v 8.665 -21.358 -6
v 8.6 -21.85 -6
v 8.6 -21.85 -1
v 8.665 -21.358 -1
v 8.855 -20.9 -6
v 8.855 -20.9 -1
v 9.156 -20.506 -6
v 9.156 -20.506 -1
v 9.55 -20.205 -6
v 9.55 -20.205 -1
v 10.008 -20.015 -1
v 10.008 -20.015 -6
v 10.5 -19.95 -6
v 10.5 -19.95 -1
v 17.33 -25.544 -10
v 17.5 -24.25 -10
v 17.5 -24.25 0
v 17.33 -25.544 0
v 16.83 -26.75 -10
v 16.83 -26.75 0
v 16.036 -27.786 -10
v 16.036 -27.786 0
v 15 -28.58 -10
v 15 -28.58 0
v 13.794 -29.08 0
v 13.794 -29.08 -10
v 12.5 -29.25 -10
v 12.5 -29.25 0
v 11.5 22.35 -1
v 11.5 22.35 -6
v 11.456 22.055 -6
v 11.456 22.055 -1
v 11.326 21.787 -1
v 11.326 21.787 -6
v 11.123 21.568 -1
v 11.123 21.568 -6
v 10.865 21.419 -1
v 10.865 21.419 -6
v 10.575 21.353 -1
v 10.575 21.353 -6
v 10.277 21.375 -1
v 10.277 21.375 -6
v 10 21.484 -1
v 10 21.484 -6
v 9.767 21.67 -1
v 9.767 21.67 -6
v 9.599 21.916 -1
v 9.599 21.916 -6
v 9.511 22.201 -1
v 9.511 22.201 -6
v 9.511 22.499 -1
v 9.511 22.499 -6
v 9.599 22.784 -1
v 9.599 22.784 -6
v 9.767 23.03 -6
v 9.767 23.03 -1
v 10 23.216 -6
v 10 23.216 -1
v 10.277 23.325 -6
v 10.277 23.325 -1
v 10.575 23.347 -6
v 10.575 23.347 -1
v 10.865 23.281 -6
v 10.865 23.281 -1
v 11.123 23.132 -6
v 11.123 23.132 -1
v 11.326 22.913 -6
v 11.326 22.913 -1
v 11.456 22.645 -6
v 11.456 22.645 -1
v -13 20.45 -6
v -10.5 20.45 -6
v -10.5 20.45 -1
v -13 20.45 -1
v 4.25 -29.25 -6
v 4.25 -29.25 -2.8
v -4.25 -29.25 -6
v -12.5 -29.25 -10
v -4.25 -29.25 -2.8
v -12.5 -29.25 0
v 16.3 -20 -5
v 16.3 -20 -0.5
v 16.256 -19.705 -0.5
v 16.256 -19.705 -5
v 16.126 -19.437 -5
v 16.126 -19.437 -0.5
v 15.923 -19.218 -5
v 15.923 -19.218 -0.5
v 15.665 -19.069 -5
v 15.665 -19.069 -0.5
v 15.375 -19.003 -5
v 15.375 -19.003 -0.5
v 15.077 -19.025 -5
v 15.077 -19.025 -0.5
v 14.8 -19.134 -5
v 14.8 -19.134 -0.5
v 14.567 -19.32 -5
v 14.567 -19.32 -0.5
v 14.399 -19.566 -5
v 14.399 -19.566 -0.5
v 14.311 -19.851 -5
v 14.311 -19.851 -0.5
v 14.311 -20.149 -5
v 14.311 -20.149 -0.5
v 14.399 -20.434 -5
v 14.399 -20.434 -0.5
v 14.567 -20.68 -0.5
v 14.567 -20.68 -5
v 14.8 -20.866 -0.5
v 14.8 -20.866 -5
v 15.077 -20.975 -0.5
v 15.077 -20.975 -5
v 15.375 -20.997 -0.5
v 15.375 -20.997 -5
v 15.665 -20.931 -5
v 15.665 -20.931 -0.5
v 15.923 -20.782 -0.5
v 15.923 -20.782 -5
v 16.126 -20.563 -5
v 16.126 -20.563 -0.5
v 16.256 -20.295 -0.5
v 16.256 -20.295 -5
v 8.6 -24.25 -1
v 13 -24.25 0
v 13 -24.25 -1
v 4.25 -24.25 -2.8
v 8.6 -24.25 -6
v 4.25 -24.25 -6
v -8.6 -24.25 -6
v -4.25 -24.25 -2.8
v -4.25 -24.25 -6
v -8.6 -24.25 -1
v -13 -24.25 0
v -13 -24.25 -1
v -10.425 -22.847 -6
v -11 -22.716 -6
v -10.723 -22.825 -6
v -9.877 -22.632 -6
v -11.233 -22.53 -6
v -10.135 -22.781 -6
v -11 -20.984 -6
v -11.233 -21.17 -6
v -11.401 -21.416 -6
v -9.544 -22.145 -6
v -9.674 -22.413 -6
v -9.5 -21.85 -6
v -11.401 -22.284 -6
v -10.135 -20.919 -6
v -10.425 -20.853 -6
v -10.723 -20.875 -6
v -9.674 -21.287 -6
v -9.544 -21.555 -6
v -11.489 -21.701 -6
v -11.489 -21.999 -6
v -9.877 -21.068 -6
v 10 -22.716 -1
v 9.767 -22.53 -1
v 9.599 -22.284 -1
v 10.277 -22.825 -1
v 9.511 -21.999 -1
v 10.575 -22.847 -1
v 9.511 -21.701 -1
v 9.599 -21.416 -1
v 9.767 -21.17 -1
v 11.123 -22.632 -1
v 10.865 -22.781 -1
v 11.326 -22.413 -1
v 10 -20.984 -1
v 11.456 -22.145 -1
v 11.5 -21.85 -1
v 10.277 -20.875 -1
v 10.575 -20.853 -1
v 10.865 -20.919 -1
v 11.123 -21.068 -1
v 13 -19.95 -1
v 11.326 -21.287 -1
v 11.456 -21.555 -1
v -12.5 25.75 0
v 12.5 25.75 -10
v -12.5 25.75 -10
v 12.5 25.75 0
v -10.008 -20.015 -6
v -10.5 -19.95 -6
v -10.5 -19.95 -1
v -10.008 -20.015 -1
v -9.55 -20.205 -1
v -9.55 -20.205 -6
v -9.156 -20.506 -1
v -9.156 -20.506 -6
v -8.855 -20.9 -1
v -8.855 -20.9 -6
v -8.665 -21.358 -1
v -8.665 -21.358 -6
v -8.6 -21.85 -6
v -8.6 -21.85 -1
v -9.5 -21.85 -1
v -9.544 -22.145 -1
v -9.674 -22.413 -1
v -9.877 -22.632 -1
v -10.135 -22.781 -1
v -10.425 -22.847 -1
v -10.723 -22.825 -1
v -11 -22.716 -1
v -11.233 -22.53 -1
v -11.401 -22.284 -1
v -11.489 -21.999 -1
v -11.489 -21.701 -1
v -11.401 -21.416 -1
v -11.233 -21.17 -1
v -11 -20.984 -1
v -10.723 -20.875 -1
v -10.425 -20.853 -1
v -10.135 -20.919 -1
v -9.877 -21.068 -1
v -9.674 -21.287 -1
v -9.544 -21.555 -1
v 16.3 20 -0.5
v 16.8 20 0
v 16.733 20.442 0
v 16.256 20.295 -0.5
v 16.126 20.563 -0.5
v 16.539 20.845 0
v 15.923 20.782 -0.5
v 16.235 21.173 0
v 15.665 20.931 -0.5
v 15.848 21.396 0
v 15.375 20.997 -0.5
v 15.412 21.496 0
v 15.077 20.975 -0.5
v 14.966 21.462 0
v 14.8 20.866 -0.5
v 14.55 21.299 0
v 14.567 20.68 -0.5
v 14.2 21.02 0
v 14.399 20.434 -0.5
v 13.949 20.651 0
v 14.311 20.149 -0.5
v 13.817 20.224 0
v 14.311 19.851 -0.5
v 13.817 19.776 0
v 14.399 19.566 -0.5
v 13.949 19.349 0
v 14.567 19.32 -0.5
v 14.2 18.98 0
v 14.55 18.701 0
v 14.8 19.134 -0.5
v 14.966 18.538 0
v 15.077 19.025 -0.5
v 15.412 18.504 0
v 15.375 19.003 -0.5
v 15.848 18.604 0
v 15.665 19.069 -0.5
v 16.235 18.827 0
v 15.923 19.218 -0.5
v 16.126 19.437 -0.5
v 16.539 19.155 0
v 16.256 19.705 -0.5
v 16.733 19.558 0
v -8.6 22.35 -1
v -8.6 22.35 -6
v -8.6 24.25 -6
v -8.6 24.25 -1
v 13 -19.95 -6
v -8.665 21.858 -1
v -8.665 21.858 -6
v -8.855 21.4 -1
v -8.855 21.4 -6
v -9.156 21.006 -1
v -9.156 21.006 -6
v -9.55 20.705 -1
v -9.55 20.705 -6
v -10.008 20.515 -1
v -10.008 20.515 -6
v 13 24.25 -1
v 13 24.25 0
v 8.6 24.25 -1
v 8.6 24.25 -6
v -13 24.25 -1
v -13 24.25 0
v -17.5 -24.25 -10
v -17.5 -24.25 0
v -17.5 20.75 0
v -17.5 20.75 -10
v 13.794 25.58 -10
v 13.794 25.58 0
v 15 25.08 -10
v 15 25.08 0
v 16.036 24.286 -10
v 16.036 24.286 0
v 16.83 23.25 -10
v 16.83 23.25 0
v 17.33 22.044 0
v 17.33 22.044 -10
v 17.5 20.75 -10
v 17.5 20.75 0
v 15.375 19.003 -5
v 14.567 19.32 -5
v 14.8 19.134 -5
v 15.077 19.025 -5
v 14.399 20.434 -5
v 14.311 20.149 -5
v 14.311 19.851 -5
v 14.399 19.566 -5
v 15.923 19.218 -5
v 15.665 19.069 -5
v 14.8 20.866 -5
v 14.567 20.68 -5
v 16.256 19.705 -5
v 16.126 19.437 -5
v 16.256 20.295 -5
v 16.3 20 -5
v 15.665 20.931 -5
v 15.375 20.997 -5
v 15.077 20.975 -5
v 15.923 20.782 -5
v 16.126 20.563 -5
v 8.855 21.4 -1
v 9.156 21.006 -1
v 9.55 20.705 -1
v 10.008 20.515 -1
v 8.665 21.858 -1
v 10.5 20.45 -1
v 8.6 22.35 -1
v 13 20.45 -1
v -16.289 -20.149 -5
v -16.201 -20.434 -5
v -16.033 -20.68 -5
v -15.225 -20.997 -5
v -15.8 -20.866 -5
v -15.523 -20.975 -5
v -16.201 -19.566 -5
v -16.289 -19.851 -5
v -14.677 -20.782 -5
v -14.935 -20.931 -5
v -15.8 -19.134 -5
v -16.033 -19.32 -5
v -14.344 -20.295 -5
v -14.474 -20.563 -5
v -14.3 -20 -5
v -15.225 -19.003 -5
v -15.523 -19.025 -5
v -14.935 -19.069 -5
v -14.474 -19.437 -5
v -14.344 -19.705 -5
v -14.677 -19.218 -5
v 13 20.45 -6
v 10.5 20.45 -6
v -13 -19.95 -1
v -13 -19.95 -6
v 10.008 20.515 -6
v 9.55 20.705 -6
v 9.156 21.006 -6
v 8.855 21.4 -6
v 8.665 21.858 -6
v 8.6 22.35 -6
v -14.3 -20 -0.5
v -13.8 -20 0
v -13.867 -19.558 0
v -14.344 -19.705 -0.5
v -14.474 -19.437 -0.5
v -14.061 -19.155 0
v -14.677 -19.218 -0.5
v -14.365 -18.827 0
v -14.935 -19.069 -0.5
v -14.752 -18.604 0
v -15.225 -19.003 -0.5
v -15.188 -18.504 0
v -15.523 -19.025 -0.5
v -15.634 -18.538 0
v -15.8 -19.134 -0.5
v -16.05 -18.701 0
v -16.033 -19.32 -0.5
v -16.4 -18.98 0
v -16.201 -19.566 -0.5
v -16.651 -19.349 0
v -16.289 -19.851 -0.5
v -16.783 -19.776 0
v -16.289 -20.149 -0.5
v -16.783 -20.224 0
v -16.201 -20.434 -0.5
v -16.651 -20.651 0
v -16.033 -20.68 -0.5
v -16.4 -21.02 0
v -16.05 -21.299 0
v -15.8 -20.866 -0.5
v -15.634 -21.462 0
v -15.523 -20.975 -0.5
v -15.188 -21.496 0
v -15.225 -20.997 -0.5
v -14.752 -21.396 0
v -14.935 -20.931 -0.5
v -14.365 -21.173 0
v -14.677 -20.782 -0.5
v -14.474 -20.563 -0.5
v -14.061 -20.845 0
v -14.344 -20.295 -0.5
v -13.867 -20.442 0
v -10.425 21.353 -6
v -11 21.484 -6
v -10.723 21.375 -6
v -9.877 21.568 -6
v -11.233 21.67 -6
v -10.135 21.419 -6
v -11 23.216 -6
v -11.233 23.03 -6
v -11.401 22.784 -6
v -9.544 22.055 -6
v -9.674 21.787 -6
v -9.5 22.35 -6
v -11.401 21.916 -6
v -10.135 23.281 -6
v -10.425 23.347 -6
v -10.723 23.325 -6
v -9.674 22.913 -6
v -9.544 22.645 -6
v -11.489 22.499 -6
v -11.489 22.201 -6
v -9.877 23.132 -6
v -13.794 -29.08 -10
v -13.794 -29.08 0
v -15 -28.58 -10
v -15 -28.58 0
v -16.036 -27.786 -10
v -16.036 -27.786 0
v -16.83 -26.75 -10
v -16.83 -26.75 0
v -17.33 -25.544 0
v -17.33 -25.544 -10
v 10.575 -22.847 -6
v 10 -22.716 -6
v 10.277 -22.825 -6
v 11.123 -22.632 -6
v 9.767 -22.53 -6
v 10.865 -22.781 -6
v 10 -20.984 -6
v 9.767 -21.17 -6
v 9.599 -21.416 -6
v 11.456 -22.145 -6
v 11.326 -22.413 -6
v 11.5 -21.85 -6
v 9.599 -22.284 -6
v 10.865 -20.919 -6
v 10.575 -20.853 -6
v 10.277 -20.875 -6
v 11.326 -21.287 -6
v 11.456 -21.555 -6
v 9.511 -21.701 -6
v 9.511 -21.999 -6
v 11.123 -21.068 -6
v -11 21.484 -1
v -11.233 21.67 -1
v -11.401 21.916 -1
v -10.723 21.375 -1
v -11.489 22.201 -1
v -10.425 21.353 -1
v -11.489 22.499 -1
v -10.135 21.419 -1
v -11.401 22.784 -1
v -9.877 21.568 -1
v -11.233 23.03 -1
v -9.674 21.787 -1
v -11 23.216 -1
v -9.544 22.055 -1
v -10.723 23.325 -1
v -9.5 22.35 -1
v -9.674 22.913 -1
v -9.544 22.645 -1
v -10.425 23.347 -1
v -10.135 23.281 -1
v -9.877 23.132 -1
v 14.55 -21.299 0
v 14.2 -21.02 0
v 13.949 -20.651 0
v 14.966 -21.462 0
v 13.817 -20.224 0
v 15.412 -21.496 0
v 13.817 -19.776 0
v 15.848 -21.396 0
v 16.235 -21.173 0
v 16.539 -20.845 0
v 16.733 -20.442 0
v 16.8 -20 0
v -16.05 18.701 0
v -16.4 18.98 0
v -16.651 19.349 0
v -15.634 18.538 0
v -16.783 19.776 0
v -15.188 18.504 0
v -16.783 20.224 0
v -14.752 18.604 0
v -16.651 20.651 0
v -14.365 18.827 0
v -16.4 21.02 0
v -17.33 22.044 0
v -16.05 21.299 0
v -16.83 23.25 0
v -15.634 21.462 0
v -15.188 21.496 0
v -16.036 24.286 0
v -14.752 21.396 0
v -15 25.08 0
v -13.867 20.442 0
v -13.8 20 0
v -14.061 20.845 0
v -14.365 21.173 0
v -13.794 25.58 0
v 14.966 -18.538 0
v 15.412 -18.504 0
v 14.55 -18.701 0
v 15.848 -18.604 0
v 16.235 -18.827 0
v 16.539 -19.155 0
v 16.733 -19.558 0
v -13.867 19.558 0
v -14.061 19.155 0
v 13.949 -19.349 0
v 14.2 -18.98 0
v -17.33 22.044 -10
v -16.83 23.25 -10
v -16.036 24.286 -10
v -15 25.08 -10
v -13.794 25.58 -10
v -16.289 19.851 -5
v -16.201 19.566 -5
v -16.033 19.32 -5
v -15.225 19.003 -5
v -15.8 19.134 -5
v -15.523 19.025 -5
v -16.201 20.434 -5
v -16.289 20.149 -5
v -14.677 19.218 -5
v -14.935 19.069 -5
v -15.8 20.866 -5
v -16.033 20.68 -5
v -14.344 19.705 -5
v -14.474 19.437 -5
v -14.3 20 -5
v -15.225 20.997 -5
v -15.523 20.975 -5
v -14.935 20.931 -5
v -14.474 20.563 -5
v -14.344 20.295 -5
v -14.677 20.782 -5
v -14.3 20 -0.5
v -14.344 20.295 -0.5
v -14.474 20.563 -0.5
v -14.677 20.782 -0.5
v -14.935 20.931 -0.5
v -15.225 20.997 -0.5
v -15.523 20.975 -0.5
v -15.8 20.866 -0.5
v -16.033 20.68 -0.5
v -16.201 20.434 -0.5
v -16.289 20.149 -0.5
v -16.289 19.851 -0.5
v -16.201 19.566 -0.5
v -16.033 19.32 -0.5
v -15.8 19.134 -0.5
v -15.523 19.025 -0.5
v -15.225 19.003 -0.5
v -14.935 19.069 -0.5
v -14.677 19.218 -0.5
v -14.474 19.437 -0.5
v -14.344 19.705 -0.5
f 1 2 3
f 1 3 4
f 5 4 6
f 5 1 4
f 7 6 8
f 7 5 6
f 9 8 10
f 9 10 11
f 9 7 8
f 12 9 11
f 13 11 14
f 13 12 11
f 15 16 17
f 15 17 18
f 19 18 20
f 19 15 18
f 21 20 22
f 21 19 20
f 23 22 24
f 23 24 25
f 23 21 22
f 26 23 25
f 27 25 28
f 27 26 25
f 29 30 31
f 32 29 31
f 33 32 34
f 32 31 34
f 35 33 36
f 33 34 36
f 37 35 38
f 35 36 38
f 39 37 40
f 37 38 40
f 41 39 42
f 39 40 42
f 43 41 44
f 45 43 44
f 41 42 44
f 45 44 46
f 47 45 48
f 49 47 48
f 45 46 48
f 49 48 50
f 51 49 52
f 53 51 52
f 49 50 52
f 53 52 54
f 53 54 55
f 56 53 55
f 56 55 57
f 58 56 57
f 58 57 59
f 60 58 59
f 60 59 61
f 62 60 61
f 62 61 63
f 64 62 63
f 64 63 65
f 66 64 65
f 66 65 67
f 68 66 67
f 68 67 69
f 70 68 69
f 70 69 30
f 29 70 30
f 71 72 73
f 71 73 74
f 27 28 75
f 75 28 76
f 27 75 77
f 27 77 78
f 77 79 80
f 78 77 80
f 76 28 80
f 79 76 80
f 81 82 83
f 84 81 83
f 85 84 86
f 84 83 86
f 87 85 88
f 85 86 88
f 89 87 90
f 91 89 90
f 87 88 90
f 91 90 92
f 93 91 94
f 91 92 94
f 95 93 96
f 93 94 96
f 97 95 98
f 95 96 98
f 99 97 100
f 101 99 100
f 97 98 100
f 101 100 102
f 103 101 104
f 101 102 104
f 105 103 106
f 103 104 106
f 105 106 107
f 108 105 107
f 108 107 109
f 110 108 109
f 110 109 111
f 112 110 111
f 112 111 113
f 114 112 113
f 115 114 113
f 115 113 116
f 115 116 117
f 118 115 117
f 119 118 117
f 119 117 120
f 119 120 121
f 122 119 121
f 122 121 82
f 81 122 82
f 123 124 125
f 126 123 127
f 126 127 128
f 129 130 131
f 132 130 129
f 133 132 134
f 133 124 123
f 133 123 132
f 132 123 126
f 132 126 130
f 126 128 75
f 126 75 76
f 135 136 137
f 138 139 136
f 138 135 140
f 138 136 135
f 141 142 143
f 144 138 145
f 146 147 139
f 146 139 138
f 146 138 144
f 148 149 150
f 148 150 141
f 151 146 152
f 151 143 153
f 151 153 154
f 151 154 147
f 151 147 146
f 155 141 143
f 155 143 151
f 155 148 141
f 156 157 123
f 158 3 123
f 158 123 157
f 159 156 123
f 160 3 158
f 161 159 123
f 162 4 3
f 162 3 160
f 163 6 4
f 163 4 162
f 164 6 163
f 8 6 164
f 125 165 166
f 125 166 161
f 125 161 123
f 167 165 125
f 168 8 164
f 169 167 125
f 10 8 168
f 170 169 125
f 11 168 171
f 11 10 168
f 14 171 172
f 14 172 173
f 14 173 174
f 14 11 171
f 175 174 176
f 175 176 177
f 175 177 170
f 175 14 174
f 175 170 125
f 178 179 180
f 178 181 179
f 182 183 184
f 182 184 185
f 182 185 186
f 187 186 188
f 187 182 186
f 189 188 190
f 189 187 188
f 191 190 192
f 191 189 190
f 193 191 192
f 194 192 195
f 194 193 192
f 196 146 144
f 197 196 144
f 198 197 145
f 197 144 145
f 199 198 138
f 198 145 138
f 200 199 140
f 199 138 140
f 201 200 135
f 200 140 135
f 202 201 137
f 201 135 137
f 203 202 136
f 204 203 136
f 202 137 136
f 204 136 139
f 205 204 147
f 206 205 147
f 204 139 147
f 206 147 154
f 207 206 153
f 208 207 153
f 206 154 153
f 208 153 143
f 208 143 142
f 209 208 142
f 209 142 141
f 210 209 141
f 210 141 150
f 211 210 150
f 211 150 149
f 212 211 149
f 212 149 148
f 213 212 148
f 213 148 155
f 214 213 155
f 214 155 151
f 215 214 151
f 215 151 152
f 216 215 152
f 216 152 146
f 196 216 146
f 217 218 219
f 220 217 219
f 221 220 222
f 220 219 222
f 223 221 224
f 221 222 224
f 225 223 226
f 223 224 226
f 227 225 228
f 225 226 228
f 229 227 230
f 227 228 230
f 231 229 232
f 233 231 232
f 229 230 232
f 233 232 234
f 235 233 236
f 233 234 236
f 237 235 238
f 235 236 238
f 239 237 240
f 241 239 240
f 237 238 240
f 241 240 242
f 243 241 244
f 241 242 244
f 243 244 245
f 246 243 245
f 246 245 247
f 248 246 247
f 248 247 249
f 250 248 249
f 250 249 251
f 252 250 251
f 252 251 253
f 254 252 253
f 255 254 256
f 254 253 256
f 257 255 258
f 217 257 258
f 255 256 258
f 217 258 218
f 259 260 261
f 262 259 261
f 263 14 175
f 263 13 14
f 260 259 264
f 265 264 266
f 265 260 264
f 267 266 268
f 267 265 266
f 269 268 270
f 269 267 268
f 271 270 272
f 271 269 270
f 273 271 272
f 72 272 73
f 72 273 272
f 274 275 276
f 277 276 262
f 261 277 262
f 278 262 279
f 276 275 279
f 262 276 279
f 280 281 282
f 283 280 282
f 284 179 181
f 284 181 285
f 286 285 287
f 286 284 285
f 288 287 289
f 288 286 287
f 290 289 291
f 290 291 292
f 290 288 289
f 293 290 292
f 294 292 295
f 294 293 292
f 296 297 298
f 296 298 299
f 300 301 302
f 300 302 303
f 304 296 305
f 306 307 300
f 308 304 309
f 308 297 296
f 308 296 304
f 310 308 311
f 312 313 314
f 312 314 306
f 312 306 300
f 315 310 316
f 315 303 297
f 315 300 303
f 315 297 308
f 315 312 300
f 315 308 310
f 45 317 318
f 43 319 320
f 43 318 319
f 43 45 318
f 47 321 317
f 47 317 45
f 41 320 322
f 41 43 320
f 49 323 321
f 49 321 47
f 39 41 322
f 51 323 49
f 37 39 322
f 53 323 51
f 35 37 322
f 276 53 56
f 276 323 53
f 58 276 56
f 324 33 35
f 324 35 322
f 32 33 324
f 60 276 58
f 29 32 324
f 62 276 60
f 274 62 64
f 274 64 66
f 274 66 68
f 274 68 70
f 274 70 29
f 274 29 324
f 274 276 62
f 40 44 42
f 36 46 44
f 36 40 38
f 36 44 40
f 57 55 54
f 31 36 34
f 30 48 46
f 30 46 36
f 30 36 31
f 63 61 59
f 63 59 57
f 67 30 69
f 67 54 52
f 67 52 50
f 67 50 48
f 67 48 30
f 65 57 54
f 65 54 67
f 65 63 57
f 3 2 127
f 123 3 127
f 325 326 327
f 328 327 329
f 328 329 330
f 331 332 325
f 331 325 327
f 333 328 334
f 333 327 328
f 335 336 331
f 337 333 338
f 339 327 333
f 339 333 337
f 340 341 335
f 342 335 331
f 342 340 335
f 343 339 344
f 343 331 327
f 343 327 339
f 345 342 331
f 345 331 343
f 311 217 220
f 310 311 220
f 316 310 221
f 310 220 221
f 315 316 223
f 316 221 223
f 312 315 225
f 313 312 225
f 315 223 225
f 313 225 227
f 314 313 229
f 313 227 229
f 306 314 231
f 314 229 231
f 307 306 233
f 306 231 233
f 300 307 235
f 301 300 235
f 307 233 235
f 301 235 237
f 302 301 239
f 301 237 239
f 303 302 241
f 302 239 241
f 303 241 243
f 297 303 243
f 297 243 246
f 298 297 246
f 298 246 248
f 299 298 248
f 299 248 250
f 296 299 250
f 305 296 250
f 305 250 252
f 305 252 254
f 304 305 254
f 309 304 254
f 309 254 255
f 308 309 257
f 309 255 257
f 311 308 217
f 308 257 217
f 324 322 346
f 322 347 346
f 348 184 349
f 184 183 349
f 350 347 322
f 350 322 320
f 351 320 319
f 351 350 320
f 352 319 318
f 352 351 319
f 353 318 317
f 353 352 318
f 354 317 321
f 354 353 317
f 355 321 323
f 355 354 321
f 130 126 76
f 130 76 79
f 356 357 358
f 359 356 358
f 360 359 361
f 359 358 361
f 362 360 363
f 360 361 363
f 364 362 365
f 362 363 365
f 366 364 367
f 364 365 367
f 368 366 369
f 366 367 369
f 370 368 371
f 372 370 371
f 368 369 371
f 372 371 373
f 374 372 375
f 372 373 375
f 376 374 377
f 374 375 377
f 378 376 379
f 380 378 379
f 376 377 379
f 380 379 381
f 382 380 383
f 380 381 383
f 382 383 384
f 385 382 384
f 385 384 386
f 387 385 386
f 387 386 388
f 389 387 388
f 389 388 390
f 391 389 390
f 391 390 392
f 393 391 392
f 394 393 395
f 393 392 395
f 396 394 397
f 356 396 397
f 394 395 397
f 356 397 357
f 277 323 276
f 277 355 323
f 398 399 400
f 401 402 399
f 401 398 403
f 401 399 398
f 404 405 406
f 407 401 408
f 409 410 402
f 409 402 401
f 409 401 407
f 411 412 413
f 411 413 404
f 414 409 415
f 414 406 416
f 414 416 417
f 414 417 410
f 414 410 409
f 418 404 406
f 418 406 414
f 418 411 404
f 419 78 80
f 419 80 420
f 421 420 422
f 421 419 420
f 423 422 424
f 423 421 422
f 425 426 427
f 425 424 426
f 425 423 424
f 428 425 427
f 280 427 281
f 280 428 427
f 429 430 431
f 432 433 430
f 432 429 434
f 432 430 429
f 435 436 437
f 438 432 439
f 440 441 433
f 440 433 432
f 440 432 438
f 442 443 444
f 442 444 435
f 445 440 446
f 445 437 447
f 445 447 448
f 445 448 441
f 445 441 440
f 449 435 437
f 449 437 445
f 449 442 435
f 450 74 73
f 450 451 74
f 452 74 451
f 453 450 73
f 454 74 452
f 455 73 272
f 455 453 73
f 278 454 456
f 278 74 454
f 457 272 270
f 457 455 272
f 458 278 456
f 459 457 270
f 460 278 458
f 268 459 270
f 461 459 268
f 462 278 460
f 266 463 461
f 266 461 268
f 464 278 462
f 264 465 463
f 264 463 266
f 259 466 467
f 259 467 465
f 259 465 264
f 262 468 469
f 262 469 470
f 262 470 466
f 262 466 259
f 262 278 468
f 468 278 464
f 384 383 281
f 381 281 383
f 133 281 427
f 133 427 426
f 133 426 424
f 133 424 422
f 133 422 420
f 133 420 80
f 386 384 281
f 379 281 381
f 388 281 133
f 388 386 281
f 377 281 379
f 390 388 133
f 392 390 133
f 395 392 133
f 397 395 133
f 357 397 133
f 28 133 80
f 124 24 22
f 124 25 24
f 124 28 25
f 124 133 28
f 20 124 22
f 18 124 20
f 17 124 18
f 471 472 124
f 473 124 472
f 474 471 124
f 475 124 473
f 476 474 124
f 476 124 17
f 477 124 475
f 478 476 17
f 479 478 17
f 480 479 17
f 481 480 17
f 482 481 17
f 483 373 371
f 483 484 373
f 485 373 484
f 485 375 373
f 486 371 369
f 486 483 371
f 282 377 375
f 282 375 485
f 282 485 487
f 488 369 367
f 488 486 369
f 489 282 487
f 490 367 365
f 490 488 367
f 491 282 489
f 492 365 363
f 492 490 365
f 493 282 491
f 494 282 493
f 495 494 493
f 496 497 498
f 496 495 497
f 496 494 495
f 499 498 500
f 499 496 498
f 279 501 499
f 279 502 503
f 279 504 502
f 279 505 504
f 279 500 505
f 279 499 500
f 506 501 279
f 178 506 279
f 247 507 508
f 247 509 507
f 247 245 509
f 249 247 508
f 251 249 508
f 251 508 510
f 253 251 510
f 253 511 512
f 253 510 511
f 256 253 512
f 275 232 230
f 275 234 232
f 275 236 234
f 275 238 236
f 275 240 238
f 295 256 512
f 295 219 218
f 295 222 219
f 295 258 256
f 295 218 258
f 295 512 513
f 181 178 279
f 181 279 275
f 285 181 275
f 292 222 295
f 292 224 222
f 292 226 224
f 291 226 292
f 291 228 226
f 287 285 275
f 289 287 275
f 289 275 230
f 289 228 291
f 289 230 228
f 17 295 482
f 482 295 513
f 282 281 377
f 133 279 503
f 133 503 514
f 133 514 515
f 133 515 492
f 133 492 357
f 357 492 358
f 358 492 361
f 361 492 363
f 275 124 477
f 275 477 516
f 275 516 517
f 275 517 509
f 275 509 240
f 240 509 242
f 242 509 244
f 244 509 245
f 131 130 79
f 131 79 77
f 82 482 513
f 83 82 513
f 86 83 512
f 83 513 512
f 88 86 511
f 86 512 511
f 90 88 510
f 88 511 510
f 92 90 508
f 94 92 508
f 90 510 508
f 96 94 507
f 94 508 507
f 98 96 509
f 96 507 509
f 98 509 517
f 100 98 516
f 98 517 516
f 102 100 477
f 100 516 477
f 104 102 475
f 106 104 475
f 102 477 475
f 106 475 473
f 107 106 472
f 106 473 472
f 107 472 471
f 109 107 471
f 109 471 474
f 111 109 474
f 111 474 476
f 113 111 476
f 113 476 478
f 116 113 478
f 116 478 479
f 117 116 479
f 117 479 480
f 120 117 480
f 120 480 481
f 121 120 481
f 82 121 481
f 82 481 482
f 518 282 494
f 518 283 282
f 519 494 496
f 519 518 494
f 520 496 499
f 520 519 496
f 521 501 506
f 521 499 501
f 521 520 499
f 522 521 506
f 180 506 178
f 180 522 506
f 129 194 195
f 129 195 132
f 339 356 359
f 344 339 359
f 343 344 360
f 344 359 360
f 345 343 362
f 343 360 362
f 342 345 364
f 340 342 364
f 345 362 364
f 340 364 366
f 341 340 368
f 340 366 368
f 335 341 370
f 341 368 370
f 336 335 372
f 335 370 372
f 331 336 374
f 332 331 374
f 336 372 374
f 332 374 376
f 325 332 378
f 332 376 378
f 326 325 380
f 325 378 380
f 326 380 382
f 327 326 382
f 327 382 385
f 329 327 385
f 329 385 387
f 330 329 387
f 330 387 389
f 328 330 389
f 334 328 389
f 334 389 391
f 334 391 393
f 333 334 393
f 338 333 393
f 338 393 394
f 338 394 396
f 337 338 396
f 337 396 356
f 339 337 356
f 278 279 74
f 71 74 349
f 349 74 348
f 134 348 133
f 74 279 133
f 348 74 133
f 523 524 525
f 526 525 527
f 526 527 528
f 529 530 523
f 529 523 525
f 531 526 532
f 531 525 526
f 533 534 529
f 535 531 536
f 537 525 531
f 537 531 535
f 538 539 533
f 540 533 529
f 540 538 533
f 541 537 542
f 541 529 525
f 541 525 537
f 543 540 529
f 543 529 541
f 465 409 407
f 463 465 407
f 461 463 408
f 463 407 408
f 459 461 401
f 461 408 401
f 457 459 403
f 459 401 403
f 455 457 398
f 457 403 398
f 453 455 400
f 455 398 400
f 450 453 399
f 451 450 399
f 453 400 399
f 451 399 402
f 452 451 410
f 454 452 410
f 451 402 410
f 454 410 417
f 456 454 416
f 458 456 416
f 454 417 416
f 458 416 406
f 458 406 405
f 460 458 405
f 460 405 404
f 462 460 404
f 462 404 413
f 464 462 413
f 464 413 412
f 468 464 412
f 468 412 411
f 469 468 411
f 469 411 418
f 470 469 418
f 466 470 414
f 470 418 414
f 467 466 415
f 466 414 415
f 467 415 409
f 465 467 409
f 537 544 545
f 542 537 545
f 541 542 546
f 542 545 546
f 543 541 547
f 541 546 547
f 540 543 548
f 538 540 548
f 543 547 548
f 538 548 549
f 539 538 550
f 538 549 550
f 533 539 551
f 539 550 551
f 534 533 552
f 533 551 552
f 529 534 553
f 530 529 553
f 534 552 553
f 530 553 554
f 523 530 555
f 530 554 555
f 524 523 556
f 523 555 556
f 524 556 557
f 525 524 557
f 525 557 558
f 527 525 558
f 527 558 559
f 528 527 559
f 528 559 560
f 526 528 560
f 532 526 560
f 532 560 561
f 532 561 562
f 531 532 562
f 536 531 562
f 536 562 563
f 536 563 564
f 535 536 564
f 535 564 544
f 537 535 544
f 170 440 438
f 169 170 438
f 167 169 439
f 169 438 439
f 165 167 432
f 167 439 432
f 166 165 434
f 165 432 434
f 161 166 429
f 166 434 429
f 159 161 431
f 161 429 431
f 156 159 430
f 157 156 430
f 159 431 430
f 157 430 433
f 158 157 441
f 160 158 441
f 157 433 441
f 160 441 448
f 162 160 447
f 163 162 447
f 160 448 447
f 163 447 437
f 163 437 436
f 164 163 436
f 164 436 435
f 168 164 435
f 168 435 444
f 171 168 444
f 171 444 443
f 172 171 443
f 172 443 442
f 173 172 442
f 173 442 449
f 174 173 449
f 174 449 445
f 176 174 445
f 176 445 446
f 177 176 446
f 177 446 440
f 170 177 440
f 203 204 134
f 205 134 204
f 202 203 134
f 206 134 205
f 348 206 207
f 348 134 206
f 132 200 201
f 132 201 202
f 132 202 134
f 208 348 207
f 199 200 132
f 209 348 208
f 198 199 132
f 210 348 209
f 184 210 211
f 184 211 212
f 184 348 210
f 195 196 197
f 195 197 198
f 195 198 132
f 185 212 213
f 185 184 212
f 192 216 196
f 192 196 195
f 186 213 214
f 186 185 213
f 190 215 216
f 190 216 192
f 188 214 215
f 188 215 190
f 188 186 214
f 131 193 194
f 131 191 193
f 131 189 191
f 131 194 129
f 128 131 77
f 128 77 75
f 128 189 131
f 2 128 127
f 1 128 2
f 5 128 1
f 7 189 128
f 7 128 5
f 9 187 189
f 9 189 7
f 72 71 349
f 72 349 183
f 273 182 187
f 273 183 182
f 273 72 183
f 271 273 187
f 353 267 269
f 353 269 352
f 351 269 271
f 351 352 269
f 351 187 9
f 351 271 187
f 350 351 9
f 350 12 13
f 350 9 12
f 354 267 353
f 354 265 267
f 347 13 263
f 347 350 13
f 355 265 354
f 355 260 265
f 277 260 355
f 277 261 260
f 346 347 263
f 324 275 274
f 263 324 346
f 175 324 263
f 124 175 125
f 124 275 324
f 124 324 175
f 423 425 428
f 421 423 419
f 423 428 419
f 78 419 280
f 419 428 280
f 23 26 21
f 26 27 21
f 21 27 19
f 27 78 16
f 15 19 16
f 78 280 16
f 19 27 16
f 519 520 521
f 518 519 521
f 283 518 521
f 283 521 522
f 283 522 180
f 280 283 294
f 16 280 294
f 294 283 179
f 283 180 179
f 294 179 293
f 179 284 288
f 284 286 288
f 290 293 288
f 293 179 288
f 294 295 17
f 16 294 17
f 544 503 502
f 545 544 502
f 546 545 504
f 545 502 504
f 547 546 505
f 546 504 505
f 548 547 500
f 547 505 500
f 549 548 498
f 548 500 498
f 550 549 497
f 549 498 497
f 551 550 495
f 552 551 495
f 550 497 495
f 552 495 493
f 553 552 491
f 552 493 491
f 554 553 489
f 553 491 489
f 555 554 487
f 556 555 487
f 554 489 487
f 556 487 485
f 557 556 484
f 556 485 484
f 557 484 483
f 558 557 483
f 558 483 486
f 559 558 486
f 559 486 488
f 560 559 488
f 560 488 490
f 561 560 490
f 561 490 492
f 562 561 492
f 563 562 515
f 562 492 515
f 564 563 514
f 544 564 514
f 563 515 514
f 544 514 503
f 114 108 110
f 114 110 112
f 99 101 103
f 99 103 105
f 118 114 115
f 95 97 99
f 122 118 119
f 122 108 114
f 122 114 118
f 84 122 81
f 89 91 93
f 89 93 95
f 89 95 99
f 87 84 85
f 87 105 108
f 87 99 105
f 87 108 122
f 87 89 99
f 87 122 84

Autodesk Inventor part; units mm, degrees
ref_plane "YZ Plane" through (0, 0, 0) normal (1, 0, 0) x (0, 1, 0)
ref_plane "XZ Plane" through (0, 0, 0) normal (0, 1, 0) x (-1, 0, 0)
ref_plane "XY Plane" through (0, 0, 0) normal (0, 0, 1) x (1, 0, 0)
sketch "스케치1" plane through (0, 0, 0) normal (0, 0, 1) x (1, 0, 0)
  line L0 (-17.5, 29.25) -> (17.5, 29.25)
  line L1 (17.5, 29.25) -> (17.5, -29.25)
  line L2 (17.5, -29.25) -> (-17.5, -29.25)
  line L3 (-17.5, -29.25) -> (-17.5, 29.25)
  line L4 (-17.5, 29.25) -> (17.5, -29.25) construction
  line L5 (17.5, 29.25) -> (-17.5, -29.25) construction
  line L6 (-13, -24.25) -> (13, -24.25)
  line L7 (13, -24.25) -> (13, 24.25)
  line L8 (13, 24.25) -> (-13, 24.25)
  line L9 (-13, 24.25) -> (-13, -24.25)
  line L10 (-13, -24.25) -> (13, 24.25) construction
  line L11 (13, -24.25) -> (-13, 24.25) construction
  line L12 (-9.5, 24.25) -> (9.5, 24.25)
  line L13 (9.5, 24.25) -> (9.5, -24.25)
  line L14 (9.5, -24.25) -> (-9.5, -24.25)
  line L15 (-9.5, -24.25) -> (-9.5, 24.25)
  line L16 (-9.5, 24.25) -> (9.5, -24.25) construction
  line L17 (9.5, 24.25) -> (-9.5, -24.25) construction
  line L18 (17.5, 25.75) -> (-17.5, 25.75)
  point P0 (0, 0)
  dimension "d0" = 58.5
  dimension "d1" = 35
  dimension "d2" = 26
  dimension "d3" = 48.5
  dimension "d4" = 3.5
  dimension "d10" = 1.5
extrude "돌출1" add sketch "스케치1" against normal blind 10 contours L18 L1 L2 L3 | L9 L8 L15 L6 | L15 L8 L13 L6 | L13 L8 L7 L6
extrude "돌출3" cut sketch "스케치1" against normal blind 6 contours L9 L8 L15 L6 | L15 L8 L13 L6 | L13 L8 L7 L6
sketch "스케치2" plane through (0, 0, -6) normal (0, 0, 1) x (1, 0, 0)
  circle A0 centre (10.5, 22.35) radius 1
  line L0 (10.5, 22.35) -> (-10.5, 22.35) construction
  line L1 (-13, 24.25) -> (13, 24.25) construction
  line L2 (0, 0) -> (0, 7.5455)
  circle A1 centre (-10.5, 22.35) radius 1
  line L3 (-13, 24.25) -> (13, 24.25) projected
  line L4 (0, 24.25) -> (0, -23.75) construction
  line L5 (0, 0.25) -> (5.5908, 0.25)
  circle A2 centre (10.5, -21.85) radius 1
  circle A3 centre (-10.5, -21.85) radius 1
  circle A4 centre (-10.5, 22.35) radius 1.9
  circle A5 centre (10.5, 22.35) radius 1.9
  circle A6 centre (10.5, -21.85) radius 1.9
  circle A7 centre (-10.5, -21.85) radius 1.9
  line L6 (-8.6, -21.85) -> (-8.6, -24.25)
  line L7 (13, -24.25) -> (-13, -24.25) projected
  line L8 (-10.5, -19.95) -> (-13, -19.95)
  line L9 (-13, -24.25) -> (-13, 24.25) projected
  line L10 (13, 24.25) -> (13, -24.25) projected
  line L11 (10.5, -19.95) -> (13, -19.95)
  line L12 (8.6, -21.85) -> (8.6, -24.25)
  line L13 (-8.6, 22.35) -> (-8.6, 24.75)
  line L14 (-10.5, 20.45) -> (-13, 20.45)
  line L15 (10.5, 20.45) -> (13, 20.45)
  line L16 (8.6, 22.35) -> (8.6, 24.75)
  point P0 (0, 22.35)
  point P1 (8.6, 24.25)
  point P2 (-8.6, 24.25)
  dimension "d13" = 2
  dimension "d14" = 21
  dimension "d15" = 1.9
  dimension "d16" = 48
  dimension "d17" = 3.8
  dimension "d18" = 3.8
extrude "돌출4" add sketch "스케치2" along normal blind 6 contours L3 A4 L14 L9 | L3 L13 A4 | A4 | L8 A7 L6 L7 L9 | L3 A5 L16 | A7 | L3 L10 L15 A5 | A5 | L12 A6 L11 L10 L7 | A6
sketch "스케치3" plane through (0, 0, 0) normal (0, 0, 1) x (1, 0, 0)
  line L0 (-8.6, 24.25) -> (8.6, 24.25) projected
  line L1 (-8.6, 24.25) -> (-13, 24.25)
  line L2 (-13, 24.25) -> (13, 24.25)
  line L3 (13, 24.25) -> (13, -24.25)
  line L4 (13, -24.25) -> (-13, -24.25)
  line L5 (-13, -24.25) -> (-13, 24.25)
  circle A0 centre (-10.5, -21.85) radius 1 projected
  circle A1 centre (10.5, 22.35) radius 1 projected
  circle A2 centre (10.5, -21.85) radius 1 projected
  circle A3 centre (-10.5, 22.35) radius 1 projected
  line L6 (-13, -19.95) -> (-13, 20.45) projected
  line L7 (-13, 20.45) -> (-10.5, 20.45) projected
  arc A4 (-10.5, 20.45) -> (-8.6, 22.35) centre (-10.5, 22.35) ccw projected
  line L8 (-8.6, 22.35) -> (-8.6, 24.25) projected
  line L9 (-8.6, 24.25) -> (8.6, 24.25) projected
  line L10 (8.6, 24.25) -> (8.6, 22.35) projected
  arc A5 (8.6, 22.35) -> (10.5, 20.45) centre (10.5, 22.35) ccw projected
  line L11 (10.5, 20.45) -> (13, 20.45) projected
  line L12 (13, 20.45) -> (13, -19.95) projected
  line L13 (13, -19.95) -> (10.5, -19.95) projected
  arc A6 (10.5, -19.95) -> (8.6, -21.85) centre (10.5, -21.85) ccw projected
  line L14 (8.6, -21.85) -> (8.6, -24.25) projected
  line L15 (8.6, -24.25) -> (-8.6, -24.25) projected
  line L16 (-8.6, -24.25) -> (-8.6, -21.85) projected
  arc A7 (-8.6, -21.85) -> (-10.5, -19.95) centre (-10.5, -21.85) ccw projected
  line L17 (-10.5, -19.95) -> (-13, -19.95) projected
  line L18 (17.5, -29.25) -> (17.5, 25.75) projected
  line L19 (17.5, 25.75) -> (-17.5, 25.75) projected
  line L20 (-17.5, 25.75) -> (-17.5, -29.25) projected
  line L21 (-17.5, -29.25) -> (17.5, -29.25) projected
  point P0 (0, 0)
  dimension "d21" = 26
  dimension "d22" = 48.5
extrude "돌출5" cut sketch "스케치3" against normal blind 1 contours L8 A4 L7 L5 L1 | L0 L10 A5 L11 L3 L13 A6 L14 L4 L16 A7 L17 L5 L7 A4 L8 | L2 L3 L11 A5 L10 | L17 A7 L16 L4 L5 | L3 L4 L14 A6 L13 | A0 | A1 | A2 | A3
sketch "스케치4" plane through (-13, -24.25, 0) normal (0, 1, 0) x (1, 0, 0)
  line L0 (8.75, 9.2) -> (17.25, 9.2)
  line L1 (17.25, 9.2) -> (17.25, 2.8)
  line L2 (17.25, 2.8) -> (8.75, 2.8)
  line L3 (8.75, 2.8) -> (8.75, 9.2)
  line L4 (4.4, 6) -> (21.6, 6) projected
  line L5 (8.75, 9.2) -> (17.25, 2.8) construction
  line L6 (17.25, 9.2) -> (8.75, 2.8) construction
  point P0 (13, 0)
  point P1 (13, 6)
  point P2 (17.25, 6)
  point P3 (8.75, 6)
  dimension "d25" = 8.5
  dimension "d26" = 6.4
extrude "돌출6" cut sketch "스케치4" against normal blind 5 contours L4 L1 L2 L3
fillet "모깎기2" radius 5 4 edges at (17.5, -29.25, -5) (-17.5, -29.25, -5) (17.5, 25.75, -5) (-17.5, 25.75, -5)
sketch "스케치5" plane through (0, 0, 0) normal (0, 0, 1) x (1, 0, 0)
  circle A0 centre (15.3, -20) radius 1
  line L0 (0, 0) -> (0, -10.3102)
  circle A1 centre (-15.3, -20) radius 1
  line L1 (0, 0) -> (6.1886, 0)
  circle A2 centre (15.3, 20) radius 1
  circle A3 centre (-15.3, 20) radius 1
  dimension "d30" = 2
  dimension "d31" = 20
  dimension "d32" = 15.3
extrude "돌출7" cut sketch "스케치5" against normal blind 5
chamfer "모따기1" distance 0.5 angle 45 4 edges at (-16.3, 20, 0) (14.3, 20, 0) (14.3, -20, 0) (-16.3, -20, 0)
properties part number "하우징"
